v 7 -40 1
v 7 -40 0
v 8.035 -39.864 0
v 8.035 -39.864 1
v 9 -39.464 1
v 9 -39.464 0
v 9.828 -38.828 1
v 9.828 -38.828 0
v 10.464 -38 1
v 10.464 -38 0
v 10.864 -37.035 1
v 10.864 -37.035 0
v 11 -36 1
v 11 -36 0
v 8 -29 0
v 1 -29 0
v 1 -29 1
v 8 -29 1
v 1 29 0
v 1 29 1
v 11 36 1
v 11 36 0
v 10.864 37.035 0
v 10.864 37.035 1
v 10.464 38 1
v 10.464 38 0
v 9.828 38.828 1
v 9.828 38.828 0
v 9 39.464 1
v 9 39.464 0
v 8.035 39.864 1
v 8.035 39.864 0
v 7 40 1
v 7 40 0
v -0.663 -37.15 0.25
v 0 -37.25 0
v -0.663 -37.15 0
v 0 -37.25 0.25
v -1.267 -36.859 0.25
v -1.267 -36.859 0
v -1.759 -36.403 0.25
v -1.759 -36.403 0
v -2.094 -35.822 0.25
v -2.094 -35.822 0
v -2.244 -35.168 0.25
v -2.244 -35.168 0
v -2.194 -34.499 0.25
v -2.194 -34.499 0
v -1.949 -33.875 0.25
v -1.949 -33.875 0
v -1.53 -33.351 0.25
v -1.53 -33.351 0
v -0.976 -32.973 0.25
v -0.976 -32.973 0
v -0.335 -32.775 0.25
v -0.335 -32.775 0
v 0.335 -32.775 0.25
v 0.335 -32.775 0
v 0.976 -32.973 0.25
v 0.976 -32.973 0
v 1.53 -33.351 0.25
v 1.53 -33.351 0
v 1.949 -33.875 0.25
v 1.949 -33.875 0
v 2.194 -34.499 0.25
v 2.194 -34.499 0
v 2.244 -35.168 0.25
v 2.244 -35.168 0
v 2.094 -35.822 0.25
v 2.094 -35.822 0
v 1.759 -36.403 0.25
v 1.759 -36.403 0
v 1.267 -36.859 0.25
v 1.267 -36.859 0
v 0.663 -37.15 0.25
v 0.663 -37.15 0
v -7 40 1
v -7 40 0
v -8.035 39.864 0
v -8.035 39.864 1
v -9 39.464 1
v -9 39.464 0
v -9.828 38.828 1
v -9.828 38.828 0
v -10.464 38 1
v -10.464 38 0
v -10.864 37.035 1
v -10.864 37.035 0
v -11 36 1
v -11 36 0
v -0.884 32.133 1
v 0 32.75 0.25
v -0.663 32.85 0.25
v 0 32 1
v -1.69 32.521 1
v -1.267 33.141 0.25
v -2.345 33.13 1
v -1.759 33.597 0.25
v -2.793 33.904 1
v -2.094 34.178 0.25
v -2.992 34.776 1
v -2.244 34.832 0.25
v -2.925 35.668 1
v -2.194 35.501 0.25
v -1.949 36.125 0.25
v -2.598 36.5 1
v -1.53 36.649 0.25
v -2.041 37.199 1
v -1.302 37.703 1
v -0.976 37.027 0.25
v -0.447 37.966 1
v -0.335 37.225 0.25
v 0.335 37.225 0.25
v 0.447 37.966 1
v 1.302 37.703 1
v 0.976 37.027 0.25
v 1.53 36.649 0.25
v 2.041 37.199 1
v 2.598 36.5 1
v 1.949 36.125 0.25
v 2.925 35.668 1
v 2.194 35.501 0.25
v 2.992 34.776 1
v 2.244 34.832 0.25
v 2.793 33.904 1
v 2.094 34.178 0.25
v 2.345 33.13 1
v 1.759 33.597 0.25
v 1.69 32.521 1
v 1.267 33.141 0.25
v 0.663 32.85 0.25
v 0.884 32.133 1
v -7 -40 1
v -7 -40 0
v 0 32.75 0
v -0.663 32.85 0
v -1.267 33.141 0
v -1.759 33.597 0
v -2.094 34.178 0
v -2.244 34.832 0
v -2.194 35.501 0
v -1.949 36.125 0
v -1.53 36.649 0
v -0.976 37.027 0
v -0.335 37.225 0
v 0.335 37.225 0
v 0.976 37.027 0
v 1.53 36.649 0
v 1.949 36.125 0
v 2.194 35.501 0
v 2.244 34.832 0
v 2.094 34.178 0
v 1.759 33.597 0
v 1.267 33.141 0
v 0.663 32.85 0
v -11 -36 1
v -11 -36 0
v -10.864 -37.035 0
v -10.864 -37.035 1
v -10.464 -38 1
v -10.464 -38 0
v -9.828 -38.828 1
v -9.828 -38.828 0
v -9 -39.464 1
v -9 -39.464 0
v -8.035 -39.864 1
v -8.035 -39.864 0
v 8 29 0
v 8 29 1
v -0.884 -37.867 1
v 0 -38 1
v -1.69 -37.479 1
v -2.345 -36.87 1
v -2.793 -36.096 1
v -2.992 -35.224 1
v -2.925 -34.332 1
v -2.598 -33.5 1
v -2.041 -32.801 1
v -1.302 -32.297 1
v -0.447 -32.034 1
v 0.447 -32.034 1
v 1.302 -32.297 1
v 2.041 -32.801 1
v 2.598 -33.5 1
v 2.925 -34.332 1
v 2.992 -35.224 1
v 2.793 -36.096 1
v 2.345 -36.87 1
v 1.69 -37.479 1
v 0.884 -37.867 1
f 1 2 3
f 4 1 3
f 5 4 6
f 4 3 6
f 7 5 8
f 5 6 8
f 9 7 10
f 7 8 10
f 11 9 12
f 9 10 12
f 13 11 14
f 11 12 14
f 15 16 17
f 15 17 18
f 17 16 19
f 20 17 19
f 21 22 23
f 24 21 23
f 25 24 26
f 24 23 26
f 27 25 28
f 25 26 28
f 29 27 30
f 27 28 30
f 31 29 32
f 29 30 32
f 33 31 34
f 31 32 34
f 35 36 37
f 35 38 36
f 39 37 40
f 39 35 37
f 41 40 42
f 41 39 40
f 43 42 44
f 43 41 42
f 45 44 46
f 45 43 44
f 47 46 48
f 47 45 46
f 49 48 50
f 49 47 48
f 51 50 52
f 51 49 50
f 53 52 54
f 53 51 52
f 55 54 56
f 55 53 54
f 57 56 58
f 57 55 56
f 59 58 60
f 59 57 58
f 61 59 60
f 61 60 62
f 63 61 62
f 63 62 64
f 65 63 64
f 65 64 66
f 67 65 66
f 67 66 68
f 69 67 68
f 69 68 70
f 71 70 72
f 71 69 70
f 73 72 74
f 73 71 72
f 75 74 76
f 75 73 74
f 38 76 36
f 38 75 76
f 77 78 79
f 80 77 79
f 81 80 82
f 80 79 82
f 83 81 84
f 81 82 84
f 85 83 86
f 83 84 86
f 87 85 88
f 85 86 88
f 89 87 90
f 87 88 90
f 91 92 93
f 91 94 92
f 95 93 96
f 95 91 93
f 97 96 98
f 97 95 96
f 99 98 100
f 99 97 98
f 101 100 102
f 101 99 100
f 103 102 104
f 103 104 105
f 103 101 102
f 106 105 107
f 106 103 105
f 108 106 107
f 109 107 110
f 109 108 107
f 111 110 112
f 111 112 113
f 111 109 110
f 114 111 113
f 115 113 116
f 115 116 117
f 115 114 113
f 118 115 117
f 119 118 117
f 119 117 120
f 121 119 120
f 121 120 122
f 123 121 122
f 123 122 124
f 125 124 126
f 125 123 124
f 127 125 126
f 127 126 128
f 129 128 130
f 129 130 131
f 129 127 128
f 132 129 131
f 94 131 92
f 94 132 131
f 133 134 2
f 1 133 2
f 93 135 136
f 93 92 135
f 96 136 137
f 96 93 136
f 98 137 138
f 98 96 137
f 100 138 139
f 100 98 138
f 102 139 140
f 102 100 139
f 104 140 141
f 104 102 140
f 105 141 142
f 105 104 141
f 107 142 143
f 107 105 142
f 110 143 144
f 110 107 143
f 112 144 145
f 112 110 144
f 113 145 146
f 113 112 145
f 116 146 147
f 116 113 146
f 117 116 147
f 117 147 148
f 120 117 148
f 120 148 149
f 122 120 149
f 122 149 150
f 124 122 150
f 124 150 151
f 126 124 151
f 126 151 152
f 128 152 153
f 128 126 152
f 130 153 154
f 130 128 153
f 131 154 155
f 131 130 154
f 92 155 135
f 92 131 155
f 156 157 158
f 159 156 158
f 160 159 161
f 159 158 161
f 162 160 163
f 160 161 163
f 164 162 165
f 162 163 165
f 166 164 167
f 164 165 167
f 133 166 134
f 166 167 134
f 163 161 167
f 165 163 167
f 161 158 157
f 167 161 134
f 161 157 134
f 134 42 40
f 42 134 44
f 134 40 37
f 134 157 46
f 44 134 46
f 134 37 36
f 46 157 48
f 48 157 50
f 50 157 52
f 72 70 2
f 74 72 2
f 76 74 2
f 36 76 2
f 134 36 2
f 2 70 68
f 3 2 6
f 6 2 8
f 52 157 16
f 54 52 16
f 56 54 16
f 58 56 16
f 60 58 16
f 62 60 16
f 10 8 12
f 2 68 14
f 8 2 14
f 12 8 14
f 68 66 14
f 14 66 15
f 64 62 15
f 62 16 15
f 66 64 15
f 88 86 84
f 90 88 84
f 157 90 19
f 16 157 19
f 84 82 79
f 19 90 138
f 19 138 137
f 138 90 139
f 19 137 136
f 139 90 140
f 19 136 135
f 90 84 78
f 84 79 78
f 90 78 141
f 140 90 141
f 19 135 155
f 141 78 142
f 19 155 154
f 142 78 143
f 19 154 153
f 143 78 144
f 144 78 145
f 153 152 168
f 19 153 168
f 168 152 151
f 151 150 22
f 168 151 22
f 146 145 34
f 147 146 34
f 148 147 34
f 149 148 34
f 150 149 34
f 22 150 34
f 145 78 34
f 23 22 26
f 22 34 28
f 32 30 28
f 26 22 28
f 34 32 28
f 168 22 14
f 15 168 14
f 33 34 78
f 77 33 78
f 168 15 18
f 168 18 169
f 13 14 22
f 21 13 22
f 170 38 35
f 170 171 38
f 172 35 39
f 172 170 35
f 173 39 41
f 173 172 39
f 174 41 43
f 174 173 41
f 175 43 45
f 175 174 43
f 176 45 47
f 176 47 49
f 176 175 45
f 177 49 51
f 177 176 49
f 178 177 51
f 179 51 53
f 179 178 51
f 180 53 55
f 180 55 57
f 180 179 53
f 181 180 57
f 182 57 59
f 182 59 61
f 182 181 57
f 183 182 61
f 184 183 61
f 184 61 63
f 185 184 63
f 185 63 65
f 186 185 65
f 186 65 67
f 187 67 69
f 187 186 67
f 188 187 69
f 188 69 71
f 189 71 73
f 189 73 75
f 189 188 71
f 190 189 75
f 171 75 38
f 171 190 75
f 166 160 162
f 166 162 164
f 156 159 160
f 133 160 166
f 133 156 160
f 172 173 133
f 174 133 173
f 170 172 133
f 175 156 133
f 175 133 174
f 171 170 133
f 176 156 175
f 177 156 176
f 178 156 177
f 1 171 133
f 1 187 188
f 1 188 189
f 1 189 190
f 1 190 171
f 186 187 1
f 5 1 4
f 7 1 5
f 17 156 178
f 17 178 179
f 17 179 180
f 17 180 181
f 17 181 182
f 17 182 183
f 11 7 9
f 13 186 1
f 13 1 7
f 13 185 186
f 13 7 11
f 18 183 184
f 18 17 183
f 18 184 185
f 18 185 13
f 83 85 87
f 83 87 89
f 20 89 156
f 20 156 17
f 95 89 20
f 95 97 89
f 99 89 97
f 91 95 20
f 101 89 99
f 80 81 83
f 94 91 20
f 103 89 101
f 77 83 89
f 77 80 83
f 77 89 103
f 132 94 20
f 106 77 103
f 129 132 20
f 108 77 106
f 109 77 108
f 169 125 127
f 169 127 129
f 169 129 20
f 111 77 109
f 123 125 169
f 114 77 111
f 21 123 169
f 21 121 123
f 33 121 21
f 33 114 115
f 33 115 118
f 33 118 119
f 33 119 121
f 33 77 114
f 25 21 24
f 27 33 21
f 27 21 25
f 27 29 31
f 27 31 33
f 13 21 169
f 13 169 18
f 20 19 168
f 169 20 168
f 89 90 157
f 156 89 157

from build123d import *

# Parameters (mm, degrees)
CROQUIS1_R                                  = 2
CROQUIS1_W                                  = 7
CROQUIS1_H                                  = 58
SALIENTE_EXTRUIR1_DEPTH                     = 1
AVELLANADO_PARA_TORNILLO_CON_CABEZA_2_COUNT = 2
AVELLANADO_PARA_TORNILLO_CON_CABEZA_2_PITCH = 70


with BuildPart() as part:
    # Croquis1 → Saliente-Extruir1 (new body)
    with BuildSketch(Plane.XY):
        with BuildLine():
            Line((-11, 36), (-11, -36))
            ThreePointArc((-11, -36), (-9.828427125, -38.828427125), (-7, -40))
            Line((-7, -40), (7, -40))
            ThreePointArc((7, -40), (9.828427125, -38.828427125), (11, -36))
            Line((11, -36), (11, 36))
            ThreePointArc((11, 36), (9.828427125, 38.828427125), (7, 40))
            Line((7, 40), (-7, 40))
            ThreePointArc((-7, 40), (-9.828427125, 38.828427125), (-11, 36))
        make_face()
        with Locations((0, 35)):
            Circle(CROQUIS1_R, mode=Mode.SUBTRACT)
        with Locations((0, -35)):
            Circle(CROQUIS1_R, mode=Mode.SUBTRACT)
        with Locations((4.5, 0)):
            Rectangle(CROQUIS1_W, CROQUIS1_H, mode=Mode.SUBTRACT)
    extrude(amount=SALIENTE_EXTRUIR1_DEPTH)

    # Croquis6 → Avellanado para tornillo con cabeza elevada avellanada de M41 (revolve, cut)
    with BuildSketch(Plane(origin=(0, 35, 1), x_dir=(0, -1, 0), z_dir=(1, 0, 0))):
        Polygon((0, 0), (0, 1), (2.25, 1), (2.25, 0.75), (3, 0), align=None)
    avellanado_para_tornillo_con_cabeza_elev = revolve(axis=Axis((0, 35, 7.35), (0, 0, -1)), mode=Mode.SUBTRACT)

    # Avellanado para tornillo con cabeza  2: Avellanado para tornillo con cabeza elevada avellanada de M41 ×2
    with Locations(*[(0, -i * AVELLANADO_PARA_TORNILLO_CON_CABEZA_2_PITCH, 0) for i in range(1, AVELLANADO_PARA_TORNILLO_CON_CABEZA_2_COUNT)]):
        add(avellanado_para_tornillo_con_cabeza_elev, mode=Mode.SUBTRACT)


solid = part.part
